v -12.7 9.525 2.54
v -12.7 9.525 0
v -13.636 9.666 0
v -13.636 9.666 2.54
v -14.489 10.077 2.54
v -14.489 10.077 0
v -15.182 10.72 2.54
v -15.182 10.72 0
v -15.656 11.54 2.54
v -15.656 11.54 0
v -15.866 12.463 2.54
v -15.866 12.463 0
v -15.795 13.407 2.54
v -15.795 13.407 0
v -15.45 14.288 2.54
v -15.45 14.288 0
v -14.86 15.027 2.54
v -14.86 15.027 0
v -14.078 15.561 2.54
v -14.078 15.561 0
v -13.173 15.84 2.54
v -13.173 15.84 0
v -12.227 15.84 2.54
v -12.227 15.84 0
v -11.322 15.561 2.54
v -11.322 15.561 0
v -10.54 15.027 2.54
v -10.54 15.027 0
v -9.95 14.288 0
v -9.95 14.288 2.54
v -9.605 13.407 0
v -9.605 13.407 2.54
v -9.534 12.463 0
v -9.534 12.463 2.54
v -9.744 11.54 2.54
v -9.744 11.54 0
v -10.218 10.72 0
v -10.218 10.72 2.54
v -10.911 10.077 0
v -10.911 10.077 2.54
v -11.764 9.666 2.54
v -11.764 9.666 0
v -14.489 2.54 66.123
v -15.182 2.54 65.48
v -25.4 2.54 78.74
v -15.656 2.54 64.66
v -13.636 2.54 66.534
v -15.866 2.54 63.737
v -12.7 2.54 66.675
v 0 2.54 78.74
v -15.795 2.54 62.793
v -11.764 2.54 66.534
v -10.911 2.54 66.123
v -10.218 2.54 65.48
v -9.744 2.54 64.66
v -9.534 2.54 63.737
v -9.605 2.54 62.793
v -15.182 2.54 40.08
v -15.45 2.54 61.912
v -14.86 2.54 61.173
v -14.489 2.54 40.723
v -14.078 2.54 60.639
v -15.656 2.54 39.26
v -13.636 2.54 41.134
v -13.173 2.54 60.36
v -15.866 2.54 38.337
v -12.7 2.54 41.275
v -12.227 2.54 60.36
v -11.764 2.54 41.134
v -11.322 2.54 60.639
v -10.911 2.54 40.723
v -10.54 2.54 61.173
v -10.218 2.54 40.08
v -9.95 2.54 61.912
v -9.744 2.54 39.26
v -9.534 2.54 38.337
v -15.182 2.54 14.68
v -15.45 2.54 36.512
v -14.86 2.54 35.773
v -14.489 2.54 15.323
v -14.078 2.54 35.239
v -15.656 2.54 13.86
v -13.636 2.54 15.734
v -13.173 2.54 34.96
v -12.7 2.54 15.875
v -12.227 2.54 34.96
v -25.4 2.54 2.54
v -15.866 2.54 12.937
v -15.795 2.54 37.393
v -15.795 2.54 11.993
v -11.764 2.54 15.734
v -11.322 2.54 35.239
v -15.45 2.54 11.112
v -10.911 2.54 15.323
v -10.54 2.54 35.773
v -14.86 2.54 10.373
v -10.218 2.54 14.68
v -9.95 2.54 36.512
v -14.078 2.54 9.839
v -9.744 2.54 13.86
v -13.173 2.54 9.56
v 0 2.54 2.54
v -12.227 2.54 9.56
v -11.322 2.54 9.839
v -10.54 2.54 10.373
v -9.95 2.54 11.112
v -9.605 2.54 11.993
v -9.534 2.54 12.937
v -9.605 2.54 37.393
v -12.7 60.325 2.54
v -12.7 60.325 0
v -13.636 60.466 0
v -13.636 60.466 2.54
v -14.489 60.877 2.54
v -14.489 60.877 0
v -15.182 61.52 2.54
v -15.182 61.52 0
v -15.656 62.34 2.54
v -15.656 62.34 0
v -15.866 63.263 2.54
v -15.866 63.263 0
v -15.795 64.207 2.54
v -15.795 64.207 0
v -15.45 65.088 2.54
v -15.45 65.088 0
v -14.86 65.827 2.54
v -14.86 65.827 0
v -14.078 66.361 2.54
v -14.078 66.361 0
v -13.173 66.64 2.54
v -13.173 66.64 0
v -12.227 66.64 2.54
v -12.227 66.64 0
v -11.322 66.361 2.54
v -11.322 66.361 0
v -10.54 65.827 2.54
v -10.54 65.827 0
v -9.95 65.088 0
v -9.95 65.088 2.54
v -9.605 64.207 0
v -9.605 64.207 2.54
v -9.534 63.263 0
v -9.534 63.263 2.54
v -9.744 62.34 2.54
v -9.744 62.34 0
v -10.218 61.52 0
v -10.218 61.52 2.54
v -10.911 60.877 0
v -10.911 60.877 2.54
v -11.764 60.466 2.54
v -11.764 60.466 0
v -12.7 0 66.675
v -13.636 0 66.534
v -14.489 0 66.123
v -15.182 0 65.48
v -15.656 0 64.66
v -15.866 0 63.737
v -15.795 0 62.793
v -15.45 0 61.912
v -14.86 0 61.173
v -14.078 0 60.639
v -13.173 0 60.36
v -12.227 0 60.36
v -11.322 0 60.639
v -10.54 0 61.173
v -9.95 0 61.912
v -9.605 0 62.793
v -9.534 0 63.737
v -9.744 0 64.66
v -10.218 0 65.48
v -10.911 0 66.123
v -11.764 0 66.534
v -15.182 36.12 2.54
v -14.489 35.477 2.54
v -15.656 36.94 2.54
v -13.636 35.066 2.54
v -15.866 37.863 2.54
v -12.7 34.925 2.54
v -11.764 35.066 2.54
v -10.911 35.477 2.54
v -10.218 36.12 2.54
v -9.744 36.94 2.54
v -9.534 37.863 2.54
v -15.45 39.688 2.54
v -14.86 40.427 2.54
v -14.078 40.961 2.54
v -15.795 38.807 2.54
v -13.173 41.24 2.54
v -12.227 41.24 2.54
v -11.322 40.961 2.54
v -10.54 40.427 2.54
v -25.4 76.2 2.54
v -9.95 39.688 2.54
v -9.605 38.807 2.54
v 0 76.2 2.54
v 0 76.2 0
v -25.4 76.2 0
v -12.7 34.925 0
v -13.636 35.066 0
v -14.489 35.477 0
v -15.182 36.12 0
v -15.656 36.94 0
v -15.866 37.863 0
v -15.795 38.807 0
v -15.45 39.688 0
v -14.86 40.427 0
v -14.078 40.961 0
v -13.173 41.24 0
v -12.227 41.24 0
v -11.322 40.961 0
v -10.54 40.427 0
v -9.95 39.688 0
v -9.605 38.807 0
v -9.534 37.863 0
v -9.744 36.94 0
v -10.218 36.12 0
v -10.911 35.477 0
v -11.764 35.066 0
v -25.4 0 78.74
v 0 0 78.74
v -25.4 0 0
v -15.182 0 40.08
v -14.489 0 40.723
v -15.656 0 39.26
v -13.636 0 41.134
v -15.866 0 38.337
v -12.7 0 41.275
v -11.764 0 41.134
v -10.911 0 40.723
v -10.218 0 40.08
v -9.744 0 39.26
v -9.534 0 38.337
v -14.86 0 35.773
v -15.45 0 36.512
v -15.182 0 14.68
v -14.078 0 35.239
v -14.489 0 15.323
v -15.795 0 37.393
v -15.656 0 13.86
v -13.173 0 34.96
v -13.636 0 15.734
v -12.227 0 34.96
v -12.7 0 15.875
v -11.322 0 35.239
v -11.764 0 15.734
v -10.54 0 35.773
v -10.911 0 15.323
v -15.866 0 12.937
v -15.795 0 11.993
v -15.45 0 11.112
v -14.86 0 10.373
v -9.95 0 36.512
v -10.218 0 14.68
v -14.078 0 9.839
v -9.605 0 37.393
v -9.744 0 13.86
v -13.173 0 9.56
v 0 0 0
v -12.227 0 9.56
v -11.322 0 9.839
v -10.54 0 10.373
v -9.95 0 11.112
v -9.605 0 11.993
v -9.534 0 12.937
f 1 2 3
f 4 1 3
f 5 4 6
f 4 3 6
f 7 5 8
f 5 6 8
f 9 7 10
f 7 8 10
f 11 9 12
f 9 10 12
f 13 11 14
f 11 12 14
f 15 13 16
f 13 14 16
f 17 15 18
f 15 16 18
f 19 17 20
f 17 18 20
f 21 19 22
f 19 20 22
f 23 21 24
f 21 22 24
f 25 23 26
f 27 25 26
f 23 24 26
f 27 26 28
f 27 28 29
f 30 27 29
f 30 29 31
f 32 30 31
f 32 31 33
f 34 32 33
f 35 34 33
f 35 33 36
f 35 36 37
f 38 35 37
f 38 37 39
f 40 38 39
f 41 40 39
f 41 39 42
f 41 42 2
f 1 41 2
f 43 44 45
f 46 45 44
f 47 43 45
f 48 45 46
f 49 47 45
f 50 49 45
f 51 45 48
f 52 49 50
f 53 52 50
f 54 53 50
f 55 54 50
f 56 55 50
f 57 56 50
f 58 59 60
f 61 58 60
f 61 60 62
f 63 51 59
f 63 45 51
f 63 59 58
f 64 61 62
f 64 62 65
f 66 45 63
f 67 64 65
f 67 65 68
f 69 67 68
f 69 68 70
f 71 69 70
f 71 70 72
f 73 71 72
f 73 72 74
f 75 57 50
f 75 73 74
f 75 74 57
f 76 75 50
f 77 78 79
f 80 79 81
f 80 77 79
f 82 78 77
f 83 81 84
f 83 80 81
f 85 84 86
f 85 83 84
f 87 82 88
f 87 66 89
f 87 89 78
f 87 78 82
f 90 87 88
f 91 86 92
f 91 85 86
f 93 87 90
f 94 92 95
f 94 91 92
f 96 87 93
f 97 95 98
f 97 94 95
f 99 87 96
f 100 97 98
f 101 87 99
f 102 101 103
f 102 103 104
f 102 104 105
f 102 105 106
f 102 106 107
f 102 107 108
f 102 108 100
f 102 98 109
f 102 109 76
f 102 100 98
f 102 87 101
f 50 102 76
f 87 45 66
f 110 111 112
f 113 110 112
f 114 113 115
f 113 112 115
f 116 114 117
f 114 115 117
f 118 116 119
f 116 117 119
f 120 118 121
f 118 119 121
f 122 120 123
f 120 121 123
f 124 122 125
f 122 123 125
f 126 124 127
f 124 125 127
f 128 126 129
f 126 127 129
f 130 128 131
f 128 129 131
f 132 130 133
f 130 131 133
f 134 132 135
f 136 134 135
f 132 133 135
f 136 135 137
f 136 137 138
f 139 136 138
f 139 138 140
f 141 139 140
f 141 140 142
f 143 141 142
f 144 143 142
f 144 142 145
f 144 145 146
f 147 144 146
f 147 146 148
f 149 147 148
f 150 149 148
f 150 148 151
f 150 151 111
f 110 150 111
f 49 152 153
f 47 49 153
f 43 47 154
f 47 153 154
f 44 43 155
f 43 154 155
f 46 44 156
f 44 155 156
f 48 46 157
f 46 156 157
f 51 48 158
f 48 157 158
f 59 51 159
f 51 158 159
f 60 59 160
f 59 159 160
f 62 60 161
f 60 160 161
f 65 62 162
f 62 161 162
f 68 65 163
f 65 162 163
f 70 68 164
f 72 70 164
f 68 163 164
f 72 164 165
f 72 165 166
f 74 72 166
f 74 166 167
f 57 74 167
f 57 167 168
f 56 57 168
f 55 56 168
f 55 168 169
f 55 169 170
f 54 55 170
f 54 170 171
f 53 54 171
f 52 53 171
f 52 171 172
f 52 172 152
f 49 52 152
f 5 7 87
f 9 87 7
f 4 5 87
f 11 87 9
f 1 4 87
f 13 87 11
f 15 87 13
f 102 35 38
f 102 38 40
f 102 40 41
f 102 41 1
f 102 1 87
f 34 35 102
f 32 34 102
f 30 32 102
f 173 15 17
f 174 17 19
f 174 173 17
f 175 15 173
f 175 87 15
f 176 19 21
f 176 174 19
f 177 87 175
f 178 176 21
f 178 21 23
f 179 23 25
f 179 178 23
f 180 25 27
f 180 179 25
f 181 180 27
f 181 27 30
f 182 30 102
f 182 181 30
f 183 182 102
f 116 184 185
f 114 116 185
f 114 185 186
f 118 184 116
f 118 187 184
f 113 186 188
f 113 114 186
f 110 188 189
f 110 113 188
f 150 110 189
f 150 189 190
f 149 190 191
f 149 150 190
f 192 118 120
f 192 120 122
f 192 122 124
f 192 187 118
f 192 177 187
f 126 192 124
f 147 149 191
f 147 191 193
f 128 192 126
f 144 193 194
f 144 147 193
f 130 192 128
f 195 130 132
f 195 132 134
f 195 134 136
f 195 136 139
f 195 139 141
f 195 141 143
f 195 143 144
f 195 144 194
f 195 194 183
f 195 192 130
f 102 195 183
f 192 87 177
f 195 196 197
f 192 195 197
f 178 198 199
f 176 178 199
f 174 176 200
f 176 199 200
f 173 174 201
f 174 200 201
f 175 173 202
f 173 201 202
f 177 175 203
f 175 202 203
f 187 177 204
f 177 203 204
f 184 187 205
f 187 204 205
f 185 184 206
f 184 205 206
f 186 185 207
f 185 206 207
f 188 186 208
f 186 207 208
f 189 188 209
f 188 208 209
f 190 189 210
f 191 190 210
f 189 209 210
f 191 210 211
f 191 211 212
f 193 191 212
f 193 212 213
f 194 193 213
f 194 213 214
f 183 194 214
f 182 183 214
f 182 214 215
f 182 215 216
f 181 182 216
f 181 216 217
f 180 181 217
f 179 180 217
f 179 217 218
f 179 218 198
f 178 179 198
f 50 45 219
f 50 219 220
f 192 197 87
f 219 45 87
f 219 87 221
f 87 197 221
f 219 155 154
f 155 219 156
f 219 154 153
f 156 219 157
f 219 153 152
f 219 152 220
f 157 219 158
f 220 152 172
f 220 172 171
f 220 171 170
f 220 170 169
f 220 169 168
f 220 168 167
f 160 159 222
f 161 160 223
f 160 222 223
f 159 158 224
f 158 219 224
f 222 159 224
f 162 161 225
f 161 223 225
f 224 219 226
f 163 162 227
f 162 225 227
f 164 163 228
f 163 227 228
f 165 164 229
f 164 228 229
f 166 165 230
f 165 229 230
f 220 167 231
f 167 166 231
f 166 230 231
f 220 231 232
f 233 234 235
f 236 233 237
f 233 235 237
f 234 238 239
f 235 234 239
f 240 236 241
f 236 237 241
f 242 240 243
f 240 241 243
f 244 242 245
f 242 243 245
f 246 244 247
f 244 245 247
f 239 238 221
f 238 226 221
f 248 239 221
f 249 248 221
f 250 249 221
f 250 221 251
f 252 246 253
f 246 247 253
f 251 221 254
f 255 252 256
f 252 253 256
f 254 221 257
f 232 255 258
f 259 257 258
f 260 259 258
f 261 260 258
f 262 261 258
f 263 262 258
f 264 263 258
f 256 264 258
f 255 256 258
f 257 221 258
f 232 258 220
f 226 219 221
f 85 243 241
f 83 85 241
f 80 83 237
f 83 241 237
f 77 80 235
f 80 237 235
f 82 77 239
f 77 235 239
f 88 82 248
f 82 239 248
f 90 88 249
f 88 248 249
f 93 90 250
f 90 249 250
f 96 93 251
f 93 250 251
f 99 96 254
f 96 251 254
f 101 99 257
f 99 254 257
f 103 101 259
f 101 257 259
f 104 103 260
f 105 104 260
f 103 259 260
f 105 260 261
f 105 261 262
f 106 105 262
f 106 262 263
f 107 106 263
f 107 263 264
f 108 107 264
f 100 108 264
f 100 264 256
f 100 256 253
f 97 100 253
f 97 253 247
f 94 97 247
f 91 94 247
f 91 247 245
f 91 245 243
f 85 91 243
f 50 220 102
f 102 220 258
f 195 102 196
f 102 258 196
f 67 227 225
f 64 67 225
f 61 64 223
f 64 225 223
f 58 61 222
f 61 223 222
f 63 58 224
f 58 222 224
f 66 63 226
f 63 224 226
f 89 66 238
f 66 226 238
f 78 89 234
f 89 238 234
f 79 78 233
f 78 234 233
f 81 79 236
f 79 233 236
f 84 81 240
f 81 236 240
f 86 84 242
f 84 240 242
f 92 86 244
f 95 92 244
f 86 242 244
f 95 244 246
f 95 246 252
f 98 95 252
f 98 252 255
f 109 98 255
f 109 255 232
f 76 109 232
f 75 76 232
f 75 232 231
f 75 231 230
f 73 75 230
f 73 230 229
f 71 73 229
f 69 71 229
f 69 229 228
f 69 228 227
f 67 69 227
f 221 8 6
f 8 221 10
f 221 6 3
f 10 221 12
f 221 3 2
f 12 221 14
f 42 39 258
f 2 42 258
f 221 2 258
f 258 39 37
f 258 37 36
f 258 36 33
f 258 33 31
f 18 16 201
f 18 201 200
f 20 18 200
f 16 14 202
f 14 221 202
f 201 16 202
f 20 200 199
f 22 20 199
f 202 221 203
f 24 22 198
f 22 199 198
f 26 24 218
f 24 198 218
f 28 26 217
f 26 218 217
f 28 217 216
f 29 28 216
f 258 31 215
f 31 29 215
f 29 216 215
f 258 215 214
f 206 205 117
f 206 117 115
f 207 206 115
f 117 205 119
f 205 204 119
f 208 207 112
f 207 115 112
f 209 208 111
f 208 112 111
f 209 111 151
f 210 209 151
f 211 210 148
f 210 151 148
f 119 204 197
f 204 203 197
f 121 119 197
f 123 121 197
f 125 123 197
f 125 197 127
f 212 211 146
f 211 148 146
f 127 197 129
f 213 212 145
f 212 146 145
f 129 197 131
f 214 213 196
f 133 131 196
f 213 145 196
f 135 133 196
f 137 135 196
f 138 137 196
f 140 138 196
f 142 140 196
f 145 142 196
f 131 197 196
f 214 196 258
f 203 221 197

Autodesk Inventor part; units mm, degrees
ref_plane "YZ Plane" through (0, 0, 0) normal (1, 0, 0) x (0, 1, 0)
ref_plane "XZ Plane" through (0, 0, 0) normal (0, 1, 0) x (-1, 0, 0)
ref_plane "XY Plane" through (0, 0, 0) normal (0, 0, 1) x (1, 0, 0)
sketch "Sketch1" plane through (0, 0, 0) normal (0, 0, 1) x (1, 0, 0)
  line L0 (0, 0) -> (0, 76.2)
  line L1 (0, 76.2) -> (-25.4, 76.2)
  line L2 (-25.4, 76.2) -> (-25.4, 0)
  line L3 (-25.4, 0) -> (0, 0)
  dimension "d0" = 76.2
  dimension "d2" = 25.4
extrude "Extrusion1" add sketch "Sketch1" along normal blind 2.54
sketch "Sketch2" plane through (0, 0, 2.54) normal (0, 0, 1) x (1, 0, 0)
  line L0 (-25.4, 0) -> (-25.4, 2.54)
  line L1 (-25.4, 76.2) -> (-25.4, 0) projected
  line L2 (-25.4, 2.54) -> (0, 2.54)
  line L3 (0, 0) -> (0, 76.2) projected
  line L4 (0, 0) -> (-25.4, 0)
  line L5 (-25.4, 0) -> (0, 0) projected
  dimension "d5" = 2.54
extrude "Extrusion2" add sketch "Sketch2" along normal blind 76.2
hole "Hole1" at (-12.7, 2.54, 12.7) direction (0, -1, 0) diameter 6.35 end through all
pattern_linear "Rectangular Pattern1" count 3 spacing 25.4 along (0, 0, 1) of "Hole1"
hole "Hole2" at (-12.7, 12.7, 2.54) direction (0, 0, -1) diameter 6.35 end through all
pattern_linear "Rectangular Pattern2" count 3 spacing 25.4 along (0, 1, 0) of "Hole2"
properties part number "L-Gusset long"
